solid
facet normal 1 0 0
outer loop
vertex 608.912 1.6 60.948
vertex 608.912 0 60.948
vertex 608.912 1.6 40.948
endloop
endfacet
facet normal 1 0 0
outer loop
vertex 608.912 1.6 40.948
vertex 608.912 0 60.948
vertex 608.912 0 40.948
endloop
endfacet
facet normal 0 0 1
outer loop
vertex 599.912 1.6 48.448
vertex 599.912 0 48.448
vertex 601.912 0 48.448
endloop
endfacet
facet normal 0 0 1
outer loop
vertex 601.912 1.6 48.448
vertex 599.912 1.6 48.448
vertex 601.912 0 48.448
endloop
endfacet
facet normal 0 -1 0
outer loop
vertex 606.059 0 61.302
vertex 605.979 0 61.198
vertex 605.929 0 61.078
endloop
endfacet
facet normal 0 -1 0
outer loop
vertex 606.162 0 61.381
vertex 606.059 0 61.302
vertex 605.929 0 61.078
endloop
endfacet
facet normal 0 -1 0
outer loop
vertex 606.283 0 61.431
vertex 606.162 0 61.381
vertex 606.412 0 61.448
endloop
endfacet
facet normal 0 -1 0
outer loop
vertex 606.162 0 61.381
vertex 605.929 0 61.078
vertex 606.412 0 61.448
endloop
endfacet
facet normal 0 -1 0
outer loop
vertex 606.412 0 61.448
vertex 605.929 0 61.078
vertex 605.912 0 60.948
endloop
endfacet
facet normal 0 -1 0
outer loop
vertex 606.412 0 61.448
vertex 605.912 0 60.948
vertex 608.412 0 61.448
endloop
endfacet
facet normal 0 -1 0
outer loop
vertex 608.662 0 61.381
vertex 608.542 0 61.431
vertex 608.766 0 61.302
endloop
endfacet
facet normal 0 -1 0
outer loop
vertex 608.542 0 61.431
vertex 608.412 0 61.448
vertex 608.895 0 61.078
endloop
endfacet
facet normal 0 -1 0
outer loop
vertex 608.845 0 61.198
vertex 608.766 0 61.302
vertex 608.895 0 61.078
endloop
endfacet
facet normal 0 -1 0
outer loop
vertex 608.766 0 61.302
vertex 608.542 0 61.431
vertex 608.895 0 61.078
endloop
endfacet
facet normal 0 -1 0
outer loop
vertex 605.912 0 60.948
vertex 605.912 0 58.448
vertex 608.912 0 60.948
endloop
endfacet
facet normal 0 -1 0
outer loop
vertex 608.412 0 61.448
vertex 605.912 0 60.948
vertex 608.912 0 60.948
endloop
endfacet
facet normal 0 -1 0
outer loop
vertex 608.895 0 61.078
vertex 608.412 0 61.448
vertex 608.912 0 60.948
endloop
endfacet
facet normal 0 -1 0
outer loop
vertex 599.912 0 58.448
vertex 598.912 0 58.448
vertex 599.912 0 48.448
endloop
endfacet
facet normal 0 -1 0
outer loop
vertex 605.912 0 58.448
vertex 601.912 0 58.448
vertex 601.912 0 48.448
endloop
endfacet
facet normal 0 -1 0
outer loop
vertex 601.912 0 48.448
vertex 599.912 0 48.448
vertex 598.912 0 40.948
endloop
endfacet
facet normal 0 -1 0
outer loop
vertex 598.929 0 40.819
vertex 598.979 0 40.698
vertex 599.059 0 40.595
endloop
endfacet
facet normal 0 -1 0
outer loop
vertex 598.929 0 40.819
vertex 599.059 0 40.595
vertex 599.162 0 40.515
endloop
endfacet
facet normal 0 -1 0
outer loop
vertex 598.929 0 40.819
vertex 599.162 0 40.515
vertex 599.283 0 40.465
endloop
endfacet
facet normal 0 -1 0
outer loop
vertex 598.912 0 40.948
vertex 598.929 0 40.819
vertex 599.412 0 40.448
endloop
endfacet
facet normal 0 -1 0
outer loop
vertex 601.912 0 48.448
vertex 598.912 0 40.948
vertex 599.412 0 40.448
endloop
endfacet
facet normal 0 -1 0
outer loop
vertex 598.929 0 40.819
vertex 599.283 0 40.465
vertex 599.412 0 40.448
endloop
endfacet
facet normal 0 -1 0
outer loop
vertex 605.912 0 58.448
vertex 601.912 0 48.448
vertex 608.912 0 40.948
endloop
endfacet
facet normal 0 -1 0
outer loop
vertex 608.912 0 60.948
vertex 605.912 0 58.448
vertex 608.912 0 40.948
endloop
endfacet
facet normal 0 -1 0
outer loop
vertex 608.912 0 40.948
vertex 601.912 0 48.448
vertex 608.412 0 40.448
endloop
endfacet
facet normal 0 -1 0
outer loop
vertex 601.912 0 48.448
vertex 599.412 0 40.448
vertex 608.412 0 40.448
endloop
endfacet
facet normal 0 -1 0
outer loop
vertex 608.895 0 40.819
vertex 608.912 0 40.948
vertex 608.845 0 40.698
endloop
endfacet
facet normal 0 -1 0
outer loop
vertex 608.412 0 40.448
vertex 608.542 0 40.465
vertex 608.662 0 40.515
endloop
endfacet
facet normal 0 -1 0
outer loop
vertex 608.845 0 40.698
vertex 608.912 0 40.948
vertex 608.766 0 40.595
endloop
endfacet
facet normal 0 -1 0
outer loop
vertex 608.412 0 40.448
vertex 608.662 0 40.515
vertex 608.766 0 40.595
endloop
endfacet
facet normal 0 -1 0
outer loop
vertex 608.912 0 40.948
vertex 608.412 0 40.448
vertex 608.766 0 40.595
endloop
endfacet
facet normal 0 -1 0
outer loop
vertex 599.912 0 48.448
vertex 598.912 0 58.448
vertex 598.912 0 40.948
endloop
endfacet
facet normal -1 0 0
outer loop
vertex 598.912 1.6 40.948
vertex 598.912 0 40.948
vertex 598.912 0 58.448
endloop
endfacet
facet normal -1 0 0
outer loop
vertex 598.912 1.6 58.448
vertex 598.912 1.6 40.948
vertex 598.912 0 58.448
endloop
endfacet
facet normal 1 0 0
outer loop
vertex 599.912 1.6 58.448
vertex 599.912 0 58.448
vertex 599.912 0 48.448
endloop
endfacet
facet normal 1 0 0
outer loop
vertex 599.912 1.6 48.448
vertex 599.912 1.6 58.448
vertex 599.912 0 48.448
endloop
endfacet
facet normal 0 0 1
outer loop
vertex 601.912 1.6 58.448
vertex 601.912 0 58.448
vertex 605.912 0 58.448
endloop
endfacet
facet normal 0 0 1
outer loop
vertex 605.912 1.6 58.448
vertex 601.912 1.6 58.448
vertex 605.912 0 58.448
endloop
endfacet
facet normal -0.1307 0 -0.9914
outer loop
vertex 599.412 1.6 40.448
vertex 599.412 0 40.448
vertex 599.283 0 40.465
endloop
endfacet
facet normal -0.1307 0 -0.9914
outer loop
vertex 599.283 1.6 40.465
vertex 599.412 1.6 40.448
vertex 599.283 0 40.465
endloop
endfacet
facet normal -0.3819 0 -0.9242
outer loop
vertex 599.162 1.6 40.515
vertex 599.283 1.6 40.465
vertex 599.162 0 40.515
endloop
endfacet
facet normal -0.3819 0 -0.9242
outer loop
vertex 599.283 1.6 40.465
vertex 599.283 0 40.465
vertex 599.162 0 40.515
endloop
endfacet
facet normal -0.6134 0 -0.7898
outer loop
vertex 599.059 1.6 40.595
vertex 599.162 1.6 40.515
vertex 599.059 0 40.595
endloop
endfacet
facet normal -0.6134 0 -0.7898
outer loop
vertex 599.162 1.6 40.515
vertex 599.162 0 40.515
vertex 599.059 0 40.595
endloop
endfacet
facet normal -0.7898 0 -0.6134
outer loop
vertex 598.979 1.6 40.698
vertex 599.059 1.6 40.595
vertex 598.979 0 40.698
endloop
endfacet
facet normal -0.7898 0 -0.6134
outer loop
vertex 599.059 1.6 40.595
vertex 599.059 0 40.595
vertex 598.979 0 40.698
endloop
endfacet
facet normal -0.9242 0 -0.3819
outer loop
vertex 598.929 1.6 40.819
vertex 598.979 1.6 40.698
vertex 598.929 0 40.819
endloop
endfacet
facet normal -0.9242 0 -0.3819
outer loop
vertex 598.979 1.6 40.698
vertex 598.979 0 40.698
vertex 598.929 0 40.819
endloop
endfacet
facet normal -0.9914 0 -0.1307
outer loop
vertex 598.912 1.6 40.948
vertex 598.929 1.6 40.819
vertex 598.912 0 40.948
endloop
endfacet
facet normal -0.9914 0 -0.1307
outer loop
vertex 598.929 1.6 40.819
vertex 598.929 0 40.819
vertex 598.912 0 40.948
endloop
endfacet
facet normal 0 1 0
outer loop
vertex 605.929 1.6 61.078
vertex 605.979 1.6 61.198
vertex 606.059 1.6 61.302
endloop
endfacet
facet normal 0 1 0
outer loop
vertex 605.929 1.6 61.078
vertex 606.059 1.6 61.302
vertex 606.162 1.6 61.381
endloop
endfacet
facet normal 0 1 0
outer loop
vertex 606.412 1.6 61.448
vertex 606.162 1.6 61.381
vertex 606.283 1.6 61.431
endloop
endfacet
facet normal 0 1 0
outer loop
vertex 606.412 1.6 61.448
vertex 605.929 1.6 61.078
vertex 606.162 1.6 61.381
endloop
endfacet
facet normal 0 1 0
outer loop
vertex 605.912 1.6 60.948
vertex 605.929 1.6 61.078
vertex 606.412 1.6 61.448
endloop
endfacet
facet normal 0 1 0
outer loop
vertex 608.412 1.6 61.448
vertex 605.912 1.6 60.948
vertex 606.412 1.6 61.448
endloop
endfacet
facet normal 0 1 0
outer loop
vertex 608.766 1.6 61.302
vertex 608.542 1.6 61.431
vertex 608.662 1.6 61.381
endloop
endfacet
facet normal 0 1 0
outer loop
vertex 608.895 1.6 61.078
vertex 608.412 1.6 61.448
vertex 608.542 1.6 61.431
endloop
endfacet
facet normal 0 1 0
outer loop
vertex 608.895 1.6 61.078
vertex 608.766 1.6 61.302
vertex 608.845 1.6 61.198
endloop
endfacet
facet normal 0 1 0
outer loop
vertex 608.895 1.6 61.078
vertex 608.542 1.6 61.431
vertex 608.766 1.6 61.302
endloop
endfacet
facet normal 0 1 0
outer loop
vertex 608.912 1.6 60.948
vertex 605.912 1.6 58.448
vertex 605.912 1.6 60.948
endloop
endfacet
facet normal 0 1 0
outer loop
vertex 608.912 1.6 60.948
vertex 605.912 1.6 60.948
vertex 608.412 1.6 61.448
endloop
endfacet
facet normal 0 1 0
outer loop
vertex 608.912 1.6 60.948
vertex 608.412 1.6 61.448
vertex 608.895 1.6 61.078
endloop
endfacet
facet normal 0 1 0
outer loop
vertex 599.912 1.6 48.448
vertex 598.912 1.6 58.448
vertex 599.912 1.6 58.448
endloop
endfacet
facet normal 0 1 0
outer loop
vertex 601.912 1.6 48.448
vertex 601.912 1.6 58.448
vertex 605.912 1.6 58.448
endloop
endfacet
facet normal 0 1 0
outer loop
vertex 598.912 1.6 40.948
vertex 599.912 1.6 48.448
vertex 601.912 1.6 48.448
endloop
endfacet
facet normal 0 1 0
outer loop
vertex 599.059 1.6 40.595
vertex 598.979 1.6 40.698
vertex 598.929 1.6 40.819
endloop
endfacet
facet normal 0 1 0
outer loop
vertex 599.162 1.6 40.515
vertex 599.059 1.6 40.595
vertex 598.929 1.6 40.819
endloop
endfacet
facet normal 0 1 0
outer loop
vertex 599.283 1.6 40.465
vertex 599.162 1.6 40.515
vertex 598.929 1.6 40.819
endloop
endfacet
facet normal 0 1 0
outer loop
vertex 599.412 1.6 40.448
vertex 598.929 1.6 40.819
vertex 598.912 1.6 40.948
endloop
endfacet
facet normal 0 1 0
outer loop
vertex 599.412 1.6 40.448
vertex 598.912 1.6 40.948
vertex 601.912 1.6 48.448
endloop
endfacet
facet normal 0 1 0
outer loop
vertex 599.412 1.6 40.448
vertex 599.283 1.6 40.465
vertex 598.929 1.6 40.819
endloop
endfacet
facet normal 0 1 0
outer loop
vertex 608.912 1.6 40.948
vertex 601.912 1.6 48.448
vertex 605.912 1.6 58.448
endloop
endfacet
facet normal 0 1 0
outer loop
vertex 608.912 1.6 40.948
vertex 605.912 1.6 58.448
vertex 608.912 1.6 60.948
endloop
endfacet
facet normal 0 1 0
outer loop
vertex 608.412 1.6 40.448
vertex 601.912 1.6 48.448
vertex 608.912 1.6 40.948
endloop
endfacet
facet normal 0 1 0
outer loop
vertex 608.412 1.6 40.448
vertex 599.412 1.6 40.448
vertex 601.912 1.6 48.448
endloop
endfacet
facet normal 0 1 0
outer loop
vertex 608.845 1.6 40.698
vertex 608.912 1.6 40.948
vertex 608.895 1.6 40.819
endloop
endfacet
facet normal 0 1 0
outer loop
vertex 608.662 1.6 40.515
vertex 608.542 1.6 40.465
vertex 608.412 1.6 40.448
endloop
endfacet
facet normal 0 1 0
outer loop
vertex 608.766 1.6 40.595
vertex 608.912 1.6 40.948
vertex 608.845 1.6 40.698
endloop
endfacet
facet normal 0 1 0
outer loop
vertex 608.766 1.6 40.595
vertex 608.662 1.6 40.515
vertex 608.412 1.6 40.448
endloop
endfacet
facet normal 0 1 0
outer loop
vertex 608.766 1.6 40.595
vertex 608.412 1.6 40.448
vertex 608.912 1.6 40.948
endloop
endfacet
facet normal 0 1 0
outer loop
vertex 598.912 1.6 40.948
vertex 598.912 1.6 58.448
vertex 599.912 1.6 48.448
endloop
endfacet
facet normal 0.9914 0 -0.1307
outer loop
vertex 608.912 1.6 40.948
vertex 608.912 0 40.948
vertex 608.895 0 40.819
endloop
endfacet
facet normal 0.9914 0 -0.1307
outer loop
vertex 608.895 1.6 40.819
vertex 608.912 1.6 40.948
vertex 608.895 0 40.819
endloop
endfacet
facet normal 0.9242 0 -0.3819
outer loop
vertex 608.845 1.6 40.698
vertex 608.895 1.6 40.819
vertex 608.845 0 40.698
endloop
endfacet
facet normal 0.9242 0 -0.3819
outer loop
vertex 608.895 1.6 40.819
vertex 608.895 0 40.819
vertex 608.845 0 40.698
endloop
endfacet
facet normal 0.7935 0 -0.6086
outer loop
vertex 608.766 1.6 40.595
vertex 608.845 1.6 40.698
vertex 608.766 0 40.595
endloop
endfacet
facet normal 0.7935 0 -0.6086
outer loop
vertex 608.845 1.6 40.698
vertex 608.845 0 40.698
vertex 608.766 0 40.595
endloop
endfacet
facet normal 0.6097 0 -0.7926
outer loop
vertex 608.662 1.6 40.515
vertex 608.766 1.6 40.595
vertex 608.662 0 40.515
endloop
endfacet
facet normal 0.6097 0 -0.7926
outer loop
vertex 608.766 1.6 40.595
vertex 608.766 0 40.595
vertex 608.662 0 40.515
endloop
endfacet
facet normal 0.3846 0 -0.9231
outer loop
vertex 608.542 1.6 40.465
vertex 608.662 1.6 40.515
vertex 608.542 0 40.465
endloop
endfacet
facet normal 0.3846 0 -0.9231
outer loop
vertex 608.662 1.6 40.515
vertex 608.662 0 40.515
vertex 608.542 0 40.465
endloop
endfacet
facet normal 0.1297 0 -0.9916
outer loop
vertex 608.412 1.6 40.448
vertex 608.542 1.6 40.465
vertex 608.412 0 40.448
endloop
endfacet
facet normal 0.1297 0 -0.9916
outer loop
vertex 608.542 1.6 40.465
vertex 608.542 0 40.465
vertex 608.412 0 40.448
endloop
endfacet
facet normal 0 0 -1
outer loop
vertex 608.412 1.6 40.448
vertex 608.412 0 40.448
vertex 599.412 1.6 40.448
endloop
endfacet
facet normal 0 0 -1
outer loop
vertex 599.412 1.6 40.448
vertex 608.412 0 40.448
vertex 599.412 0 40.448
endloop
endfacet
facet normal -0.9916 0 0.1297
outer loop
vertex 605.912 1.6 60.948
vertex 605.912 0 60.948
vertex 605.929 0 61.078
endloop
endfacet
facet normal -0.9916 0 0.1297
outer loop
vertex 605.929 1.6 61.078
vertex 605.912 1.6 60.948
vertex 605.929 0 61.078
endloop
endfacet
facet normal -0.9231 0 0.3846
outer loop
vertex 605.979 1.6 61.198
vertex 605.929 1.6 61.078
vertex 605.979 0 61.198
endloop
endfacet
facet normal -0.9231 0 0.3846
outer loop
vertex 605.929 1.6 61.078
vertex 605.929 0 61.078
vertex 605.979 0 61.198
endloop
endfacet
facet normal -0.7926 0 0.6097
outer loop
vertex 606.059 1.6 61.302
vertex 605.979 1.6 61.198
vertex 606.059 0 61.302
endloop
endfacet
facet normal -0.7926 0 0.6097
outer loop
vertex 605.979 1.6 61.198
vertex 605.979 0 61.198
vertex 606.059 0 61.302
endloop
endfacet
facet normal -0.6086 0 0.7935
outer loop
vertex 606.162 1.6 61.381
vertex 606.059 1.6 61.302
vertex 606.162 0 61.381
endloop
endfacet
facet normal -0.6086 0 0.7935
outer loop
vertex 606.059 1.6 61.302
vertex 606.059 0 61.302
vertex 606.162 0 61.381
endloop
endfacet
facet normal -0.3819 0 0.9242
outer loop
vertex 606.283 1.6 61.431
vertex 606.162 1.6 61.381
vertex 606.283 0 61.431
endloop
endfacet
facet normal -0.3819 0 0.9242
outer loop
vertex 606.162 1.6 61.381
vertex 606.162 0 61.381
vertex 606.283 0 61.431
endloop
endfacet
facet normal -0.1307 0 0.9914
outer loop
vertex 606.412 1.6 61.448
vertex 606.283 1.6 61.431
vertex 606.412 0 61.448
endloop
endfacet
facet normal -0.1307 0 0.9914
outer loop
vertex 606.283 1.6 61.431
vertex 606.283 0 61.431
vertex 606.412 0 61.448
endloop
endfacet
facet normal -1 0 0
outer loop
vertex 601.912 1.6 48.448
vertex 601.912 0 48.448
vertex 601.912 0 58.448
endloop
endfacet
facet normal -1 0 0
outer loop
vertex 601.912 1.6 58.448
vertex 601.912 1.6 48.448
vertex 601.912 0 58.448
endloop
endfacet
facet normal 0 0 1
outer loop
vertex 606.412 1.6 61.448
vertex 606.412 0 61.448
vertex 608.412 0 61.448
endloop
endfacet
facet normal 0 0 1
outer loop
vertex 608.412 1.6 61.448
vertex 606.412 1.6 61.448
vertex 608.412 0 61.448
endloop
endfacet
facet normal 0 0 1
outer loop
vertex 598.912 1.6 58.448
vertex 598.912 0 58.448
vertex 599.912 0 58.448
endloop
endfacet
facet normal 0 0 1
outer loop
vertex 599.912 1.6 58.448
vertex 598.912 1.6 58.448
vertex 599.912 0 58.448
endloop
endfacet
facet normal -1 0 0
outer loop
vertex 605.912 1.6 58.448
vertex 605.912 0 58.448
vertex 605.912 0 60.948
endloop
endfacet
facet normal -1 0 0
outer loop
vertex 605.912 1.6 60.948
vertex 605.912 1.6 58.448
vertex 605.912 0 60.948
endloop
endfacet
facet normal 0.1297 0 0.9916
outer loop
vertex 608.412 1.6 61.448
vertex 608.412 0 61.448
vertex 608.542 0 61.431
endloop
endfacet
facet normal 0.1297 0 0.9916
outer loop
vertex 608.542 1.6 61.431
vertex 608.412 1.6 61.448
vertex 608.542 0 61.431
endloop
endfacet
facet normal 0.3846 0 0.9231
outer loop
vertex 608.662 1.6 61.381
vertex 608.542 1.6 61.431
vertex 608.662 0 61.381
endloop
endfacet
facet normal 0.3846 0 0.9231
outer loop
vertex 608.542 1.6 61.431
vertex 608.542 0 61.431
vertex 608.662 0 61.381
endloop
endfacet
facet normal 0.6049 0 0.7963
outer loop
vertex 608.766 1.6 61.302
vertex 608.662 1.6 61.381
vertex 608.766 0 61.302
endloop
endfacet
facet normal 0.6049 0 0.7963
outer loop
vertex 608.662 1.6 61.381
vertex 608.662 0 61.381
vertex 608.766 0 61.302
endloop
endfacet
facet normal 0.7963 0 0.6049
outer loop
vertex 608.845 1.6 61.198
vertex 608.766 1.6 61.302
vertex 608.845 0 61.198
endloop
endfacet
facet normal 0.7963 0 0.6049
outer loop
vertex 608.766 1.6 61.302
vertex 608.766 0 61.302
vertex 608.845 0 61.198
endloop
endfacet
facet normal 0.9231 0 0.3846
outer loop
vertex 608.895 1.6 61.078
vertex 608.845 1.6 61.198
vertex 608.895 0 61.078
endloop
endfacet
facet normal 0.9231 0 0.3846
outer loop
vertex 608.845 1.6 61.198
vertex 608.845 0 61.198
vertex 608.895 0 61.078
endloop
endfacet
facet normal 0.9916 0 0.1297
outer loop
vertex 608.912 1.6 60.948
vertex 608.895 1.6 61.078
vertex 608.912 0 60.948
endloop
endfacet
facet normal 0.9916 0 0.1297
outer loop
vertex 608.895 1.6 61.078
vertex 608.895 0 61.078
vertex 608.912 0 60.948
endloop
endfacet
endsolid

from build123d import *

# Parameters (mm, degrees)
BOSS_EXTRUDE1_DEPTH = 1.6


with BuildPart() as part:
    # Sketch2 → Boss-Extrude1 (new body)
    with BuildSketch(Plane(origin=(0, 0, 0), x_dir=(1, 0, 0), z_dir=(0, 1, 0))):
        with BuildLine():
            Line((606.412306421, -61.448413556), (608.412306421, -61.448413556))
            ThreePointArc((608.412306421, -61.448413556), (608.765859812, -61.301966947), (608.912306421, -60.948413556))
            Line((608.912306421, -60.948413556), (608.912306421, -40.948413556))
            ThreePointArc((608.912306421, -40.948413556), (608.765859812, -40.594860166), (608.412306421, -40.448413556))
            Line((608.412306421, -40.448413556), (599.412306421, -40.448413556))
            ThreePointArc((599.412306421, -40.448413556), (599.05875303, -40.594860166), (598.912306421, -40.948413556))
            Line((598.912306421, -40.948413556), (598.912306421, -58.448413556))
            Line((598.912306421, -58.448413556), (599.662306421, -58.448413556))
            Line((599.662306421, -58.448413556), (599.912306421, -58.448413556))
            Line((599.912306421, -58.448413556), (599.912306421, -48.448413556))
            Line((599.912306421, -48.448413556), (601.912306421, -48.448413556))
            Line((601.912306421, -48.448413556), (601.912306421, -58.448413556))
            Line((601.912306421, -58.448413556), (602.162306421, -58.448413556))
            Line((602.162306421, -58.448413556), (605.912306421, -58.448413556))
            Line((605.912306421, -58.448413556), (605.912306421, -60.948413556))
            ThreePointArc((605.912306421, -60.948413556), (606.05875303, -61.301966947), (606.412306421, -61.448413556))
        make_face()
    extrude(amount=BOSS_EXTRUDE1_DEPTH)


solid = part.part
